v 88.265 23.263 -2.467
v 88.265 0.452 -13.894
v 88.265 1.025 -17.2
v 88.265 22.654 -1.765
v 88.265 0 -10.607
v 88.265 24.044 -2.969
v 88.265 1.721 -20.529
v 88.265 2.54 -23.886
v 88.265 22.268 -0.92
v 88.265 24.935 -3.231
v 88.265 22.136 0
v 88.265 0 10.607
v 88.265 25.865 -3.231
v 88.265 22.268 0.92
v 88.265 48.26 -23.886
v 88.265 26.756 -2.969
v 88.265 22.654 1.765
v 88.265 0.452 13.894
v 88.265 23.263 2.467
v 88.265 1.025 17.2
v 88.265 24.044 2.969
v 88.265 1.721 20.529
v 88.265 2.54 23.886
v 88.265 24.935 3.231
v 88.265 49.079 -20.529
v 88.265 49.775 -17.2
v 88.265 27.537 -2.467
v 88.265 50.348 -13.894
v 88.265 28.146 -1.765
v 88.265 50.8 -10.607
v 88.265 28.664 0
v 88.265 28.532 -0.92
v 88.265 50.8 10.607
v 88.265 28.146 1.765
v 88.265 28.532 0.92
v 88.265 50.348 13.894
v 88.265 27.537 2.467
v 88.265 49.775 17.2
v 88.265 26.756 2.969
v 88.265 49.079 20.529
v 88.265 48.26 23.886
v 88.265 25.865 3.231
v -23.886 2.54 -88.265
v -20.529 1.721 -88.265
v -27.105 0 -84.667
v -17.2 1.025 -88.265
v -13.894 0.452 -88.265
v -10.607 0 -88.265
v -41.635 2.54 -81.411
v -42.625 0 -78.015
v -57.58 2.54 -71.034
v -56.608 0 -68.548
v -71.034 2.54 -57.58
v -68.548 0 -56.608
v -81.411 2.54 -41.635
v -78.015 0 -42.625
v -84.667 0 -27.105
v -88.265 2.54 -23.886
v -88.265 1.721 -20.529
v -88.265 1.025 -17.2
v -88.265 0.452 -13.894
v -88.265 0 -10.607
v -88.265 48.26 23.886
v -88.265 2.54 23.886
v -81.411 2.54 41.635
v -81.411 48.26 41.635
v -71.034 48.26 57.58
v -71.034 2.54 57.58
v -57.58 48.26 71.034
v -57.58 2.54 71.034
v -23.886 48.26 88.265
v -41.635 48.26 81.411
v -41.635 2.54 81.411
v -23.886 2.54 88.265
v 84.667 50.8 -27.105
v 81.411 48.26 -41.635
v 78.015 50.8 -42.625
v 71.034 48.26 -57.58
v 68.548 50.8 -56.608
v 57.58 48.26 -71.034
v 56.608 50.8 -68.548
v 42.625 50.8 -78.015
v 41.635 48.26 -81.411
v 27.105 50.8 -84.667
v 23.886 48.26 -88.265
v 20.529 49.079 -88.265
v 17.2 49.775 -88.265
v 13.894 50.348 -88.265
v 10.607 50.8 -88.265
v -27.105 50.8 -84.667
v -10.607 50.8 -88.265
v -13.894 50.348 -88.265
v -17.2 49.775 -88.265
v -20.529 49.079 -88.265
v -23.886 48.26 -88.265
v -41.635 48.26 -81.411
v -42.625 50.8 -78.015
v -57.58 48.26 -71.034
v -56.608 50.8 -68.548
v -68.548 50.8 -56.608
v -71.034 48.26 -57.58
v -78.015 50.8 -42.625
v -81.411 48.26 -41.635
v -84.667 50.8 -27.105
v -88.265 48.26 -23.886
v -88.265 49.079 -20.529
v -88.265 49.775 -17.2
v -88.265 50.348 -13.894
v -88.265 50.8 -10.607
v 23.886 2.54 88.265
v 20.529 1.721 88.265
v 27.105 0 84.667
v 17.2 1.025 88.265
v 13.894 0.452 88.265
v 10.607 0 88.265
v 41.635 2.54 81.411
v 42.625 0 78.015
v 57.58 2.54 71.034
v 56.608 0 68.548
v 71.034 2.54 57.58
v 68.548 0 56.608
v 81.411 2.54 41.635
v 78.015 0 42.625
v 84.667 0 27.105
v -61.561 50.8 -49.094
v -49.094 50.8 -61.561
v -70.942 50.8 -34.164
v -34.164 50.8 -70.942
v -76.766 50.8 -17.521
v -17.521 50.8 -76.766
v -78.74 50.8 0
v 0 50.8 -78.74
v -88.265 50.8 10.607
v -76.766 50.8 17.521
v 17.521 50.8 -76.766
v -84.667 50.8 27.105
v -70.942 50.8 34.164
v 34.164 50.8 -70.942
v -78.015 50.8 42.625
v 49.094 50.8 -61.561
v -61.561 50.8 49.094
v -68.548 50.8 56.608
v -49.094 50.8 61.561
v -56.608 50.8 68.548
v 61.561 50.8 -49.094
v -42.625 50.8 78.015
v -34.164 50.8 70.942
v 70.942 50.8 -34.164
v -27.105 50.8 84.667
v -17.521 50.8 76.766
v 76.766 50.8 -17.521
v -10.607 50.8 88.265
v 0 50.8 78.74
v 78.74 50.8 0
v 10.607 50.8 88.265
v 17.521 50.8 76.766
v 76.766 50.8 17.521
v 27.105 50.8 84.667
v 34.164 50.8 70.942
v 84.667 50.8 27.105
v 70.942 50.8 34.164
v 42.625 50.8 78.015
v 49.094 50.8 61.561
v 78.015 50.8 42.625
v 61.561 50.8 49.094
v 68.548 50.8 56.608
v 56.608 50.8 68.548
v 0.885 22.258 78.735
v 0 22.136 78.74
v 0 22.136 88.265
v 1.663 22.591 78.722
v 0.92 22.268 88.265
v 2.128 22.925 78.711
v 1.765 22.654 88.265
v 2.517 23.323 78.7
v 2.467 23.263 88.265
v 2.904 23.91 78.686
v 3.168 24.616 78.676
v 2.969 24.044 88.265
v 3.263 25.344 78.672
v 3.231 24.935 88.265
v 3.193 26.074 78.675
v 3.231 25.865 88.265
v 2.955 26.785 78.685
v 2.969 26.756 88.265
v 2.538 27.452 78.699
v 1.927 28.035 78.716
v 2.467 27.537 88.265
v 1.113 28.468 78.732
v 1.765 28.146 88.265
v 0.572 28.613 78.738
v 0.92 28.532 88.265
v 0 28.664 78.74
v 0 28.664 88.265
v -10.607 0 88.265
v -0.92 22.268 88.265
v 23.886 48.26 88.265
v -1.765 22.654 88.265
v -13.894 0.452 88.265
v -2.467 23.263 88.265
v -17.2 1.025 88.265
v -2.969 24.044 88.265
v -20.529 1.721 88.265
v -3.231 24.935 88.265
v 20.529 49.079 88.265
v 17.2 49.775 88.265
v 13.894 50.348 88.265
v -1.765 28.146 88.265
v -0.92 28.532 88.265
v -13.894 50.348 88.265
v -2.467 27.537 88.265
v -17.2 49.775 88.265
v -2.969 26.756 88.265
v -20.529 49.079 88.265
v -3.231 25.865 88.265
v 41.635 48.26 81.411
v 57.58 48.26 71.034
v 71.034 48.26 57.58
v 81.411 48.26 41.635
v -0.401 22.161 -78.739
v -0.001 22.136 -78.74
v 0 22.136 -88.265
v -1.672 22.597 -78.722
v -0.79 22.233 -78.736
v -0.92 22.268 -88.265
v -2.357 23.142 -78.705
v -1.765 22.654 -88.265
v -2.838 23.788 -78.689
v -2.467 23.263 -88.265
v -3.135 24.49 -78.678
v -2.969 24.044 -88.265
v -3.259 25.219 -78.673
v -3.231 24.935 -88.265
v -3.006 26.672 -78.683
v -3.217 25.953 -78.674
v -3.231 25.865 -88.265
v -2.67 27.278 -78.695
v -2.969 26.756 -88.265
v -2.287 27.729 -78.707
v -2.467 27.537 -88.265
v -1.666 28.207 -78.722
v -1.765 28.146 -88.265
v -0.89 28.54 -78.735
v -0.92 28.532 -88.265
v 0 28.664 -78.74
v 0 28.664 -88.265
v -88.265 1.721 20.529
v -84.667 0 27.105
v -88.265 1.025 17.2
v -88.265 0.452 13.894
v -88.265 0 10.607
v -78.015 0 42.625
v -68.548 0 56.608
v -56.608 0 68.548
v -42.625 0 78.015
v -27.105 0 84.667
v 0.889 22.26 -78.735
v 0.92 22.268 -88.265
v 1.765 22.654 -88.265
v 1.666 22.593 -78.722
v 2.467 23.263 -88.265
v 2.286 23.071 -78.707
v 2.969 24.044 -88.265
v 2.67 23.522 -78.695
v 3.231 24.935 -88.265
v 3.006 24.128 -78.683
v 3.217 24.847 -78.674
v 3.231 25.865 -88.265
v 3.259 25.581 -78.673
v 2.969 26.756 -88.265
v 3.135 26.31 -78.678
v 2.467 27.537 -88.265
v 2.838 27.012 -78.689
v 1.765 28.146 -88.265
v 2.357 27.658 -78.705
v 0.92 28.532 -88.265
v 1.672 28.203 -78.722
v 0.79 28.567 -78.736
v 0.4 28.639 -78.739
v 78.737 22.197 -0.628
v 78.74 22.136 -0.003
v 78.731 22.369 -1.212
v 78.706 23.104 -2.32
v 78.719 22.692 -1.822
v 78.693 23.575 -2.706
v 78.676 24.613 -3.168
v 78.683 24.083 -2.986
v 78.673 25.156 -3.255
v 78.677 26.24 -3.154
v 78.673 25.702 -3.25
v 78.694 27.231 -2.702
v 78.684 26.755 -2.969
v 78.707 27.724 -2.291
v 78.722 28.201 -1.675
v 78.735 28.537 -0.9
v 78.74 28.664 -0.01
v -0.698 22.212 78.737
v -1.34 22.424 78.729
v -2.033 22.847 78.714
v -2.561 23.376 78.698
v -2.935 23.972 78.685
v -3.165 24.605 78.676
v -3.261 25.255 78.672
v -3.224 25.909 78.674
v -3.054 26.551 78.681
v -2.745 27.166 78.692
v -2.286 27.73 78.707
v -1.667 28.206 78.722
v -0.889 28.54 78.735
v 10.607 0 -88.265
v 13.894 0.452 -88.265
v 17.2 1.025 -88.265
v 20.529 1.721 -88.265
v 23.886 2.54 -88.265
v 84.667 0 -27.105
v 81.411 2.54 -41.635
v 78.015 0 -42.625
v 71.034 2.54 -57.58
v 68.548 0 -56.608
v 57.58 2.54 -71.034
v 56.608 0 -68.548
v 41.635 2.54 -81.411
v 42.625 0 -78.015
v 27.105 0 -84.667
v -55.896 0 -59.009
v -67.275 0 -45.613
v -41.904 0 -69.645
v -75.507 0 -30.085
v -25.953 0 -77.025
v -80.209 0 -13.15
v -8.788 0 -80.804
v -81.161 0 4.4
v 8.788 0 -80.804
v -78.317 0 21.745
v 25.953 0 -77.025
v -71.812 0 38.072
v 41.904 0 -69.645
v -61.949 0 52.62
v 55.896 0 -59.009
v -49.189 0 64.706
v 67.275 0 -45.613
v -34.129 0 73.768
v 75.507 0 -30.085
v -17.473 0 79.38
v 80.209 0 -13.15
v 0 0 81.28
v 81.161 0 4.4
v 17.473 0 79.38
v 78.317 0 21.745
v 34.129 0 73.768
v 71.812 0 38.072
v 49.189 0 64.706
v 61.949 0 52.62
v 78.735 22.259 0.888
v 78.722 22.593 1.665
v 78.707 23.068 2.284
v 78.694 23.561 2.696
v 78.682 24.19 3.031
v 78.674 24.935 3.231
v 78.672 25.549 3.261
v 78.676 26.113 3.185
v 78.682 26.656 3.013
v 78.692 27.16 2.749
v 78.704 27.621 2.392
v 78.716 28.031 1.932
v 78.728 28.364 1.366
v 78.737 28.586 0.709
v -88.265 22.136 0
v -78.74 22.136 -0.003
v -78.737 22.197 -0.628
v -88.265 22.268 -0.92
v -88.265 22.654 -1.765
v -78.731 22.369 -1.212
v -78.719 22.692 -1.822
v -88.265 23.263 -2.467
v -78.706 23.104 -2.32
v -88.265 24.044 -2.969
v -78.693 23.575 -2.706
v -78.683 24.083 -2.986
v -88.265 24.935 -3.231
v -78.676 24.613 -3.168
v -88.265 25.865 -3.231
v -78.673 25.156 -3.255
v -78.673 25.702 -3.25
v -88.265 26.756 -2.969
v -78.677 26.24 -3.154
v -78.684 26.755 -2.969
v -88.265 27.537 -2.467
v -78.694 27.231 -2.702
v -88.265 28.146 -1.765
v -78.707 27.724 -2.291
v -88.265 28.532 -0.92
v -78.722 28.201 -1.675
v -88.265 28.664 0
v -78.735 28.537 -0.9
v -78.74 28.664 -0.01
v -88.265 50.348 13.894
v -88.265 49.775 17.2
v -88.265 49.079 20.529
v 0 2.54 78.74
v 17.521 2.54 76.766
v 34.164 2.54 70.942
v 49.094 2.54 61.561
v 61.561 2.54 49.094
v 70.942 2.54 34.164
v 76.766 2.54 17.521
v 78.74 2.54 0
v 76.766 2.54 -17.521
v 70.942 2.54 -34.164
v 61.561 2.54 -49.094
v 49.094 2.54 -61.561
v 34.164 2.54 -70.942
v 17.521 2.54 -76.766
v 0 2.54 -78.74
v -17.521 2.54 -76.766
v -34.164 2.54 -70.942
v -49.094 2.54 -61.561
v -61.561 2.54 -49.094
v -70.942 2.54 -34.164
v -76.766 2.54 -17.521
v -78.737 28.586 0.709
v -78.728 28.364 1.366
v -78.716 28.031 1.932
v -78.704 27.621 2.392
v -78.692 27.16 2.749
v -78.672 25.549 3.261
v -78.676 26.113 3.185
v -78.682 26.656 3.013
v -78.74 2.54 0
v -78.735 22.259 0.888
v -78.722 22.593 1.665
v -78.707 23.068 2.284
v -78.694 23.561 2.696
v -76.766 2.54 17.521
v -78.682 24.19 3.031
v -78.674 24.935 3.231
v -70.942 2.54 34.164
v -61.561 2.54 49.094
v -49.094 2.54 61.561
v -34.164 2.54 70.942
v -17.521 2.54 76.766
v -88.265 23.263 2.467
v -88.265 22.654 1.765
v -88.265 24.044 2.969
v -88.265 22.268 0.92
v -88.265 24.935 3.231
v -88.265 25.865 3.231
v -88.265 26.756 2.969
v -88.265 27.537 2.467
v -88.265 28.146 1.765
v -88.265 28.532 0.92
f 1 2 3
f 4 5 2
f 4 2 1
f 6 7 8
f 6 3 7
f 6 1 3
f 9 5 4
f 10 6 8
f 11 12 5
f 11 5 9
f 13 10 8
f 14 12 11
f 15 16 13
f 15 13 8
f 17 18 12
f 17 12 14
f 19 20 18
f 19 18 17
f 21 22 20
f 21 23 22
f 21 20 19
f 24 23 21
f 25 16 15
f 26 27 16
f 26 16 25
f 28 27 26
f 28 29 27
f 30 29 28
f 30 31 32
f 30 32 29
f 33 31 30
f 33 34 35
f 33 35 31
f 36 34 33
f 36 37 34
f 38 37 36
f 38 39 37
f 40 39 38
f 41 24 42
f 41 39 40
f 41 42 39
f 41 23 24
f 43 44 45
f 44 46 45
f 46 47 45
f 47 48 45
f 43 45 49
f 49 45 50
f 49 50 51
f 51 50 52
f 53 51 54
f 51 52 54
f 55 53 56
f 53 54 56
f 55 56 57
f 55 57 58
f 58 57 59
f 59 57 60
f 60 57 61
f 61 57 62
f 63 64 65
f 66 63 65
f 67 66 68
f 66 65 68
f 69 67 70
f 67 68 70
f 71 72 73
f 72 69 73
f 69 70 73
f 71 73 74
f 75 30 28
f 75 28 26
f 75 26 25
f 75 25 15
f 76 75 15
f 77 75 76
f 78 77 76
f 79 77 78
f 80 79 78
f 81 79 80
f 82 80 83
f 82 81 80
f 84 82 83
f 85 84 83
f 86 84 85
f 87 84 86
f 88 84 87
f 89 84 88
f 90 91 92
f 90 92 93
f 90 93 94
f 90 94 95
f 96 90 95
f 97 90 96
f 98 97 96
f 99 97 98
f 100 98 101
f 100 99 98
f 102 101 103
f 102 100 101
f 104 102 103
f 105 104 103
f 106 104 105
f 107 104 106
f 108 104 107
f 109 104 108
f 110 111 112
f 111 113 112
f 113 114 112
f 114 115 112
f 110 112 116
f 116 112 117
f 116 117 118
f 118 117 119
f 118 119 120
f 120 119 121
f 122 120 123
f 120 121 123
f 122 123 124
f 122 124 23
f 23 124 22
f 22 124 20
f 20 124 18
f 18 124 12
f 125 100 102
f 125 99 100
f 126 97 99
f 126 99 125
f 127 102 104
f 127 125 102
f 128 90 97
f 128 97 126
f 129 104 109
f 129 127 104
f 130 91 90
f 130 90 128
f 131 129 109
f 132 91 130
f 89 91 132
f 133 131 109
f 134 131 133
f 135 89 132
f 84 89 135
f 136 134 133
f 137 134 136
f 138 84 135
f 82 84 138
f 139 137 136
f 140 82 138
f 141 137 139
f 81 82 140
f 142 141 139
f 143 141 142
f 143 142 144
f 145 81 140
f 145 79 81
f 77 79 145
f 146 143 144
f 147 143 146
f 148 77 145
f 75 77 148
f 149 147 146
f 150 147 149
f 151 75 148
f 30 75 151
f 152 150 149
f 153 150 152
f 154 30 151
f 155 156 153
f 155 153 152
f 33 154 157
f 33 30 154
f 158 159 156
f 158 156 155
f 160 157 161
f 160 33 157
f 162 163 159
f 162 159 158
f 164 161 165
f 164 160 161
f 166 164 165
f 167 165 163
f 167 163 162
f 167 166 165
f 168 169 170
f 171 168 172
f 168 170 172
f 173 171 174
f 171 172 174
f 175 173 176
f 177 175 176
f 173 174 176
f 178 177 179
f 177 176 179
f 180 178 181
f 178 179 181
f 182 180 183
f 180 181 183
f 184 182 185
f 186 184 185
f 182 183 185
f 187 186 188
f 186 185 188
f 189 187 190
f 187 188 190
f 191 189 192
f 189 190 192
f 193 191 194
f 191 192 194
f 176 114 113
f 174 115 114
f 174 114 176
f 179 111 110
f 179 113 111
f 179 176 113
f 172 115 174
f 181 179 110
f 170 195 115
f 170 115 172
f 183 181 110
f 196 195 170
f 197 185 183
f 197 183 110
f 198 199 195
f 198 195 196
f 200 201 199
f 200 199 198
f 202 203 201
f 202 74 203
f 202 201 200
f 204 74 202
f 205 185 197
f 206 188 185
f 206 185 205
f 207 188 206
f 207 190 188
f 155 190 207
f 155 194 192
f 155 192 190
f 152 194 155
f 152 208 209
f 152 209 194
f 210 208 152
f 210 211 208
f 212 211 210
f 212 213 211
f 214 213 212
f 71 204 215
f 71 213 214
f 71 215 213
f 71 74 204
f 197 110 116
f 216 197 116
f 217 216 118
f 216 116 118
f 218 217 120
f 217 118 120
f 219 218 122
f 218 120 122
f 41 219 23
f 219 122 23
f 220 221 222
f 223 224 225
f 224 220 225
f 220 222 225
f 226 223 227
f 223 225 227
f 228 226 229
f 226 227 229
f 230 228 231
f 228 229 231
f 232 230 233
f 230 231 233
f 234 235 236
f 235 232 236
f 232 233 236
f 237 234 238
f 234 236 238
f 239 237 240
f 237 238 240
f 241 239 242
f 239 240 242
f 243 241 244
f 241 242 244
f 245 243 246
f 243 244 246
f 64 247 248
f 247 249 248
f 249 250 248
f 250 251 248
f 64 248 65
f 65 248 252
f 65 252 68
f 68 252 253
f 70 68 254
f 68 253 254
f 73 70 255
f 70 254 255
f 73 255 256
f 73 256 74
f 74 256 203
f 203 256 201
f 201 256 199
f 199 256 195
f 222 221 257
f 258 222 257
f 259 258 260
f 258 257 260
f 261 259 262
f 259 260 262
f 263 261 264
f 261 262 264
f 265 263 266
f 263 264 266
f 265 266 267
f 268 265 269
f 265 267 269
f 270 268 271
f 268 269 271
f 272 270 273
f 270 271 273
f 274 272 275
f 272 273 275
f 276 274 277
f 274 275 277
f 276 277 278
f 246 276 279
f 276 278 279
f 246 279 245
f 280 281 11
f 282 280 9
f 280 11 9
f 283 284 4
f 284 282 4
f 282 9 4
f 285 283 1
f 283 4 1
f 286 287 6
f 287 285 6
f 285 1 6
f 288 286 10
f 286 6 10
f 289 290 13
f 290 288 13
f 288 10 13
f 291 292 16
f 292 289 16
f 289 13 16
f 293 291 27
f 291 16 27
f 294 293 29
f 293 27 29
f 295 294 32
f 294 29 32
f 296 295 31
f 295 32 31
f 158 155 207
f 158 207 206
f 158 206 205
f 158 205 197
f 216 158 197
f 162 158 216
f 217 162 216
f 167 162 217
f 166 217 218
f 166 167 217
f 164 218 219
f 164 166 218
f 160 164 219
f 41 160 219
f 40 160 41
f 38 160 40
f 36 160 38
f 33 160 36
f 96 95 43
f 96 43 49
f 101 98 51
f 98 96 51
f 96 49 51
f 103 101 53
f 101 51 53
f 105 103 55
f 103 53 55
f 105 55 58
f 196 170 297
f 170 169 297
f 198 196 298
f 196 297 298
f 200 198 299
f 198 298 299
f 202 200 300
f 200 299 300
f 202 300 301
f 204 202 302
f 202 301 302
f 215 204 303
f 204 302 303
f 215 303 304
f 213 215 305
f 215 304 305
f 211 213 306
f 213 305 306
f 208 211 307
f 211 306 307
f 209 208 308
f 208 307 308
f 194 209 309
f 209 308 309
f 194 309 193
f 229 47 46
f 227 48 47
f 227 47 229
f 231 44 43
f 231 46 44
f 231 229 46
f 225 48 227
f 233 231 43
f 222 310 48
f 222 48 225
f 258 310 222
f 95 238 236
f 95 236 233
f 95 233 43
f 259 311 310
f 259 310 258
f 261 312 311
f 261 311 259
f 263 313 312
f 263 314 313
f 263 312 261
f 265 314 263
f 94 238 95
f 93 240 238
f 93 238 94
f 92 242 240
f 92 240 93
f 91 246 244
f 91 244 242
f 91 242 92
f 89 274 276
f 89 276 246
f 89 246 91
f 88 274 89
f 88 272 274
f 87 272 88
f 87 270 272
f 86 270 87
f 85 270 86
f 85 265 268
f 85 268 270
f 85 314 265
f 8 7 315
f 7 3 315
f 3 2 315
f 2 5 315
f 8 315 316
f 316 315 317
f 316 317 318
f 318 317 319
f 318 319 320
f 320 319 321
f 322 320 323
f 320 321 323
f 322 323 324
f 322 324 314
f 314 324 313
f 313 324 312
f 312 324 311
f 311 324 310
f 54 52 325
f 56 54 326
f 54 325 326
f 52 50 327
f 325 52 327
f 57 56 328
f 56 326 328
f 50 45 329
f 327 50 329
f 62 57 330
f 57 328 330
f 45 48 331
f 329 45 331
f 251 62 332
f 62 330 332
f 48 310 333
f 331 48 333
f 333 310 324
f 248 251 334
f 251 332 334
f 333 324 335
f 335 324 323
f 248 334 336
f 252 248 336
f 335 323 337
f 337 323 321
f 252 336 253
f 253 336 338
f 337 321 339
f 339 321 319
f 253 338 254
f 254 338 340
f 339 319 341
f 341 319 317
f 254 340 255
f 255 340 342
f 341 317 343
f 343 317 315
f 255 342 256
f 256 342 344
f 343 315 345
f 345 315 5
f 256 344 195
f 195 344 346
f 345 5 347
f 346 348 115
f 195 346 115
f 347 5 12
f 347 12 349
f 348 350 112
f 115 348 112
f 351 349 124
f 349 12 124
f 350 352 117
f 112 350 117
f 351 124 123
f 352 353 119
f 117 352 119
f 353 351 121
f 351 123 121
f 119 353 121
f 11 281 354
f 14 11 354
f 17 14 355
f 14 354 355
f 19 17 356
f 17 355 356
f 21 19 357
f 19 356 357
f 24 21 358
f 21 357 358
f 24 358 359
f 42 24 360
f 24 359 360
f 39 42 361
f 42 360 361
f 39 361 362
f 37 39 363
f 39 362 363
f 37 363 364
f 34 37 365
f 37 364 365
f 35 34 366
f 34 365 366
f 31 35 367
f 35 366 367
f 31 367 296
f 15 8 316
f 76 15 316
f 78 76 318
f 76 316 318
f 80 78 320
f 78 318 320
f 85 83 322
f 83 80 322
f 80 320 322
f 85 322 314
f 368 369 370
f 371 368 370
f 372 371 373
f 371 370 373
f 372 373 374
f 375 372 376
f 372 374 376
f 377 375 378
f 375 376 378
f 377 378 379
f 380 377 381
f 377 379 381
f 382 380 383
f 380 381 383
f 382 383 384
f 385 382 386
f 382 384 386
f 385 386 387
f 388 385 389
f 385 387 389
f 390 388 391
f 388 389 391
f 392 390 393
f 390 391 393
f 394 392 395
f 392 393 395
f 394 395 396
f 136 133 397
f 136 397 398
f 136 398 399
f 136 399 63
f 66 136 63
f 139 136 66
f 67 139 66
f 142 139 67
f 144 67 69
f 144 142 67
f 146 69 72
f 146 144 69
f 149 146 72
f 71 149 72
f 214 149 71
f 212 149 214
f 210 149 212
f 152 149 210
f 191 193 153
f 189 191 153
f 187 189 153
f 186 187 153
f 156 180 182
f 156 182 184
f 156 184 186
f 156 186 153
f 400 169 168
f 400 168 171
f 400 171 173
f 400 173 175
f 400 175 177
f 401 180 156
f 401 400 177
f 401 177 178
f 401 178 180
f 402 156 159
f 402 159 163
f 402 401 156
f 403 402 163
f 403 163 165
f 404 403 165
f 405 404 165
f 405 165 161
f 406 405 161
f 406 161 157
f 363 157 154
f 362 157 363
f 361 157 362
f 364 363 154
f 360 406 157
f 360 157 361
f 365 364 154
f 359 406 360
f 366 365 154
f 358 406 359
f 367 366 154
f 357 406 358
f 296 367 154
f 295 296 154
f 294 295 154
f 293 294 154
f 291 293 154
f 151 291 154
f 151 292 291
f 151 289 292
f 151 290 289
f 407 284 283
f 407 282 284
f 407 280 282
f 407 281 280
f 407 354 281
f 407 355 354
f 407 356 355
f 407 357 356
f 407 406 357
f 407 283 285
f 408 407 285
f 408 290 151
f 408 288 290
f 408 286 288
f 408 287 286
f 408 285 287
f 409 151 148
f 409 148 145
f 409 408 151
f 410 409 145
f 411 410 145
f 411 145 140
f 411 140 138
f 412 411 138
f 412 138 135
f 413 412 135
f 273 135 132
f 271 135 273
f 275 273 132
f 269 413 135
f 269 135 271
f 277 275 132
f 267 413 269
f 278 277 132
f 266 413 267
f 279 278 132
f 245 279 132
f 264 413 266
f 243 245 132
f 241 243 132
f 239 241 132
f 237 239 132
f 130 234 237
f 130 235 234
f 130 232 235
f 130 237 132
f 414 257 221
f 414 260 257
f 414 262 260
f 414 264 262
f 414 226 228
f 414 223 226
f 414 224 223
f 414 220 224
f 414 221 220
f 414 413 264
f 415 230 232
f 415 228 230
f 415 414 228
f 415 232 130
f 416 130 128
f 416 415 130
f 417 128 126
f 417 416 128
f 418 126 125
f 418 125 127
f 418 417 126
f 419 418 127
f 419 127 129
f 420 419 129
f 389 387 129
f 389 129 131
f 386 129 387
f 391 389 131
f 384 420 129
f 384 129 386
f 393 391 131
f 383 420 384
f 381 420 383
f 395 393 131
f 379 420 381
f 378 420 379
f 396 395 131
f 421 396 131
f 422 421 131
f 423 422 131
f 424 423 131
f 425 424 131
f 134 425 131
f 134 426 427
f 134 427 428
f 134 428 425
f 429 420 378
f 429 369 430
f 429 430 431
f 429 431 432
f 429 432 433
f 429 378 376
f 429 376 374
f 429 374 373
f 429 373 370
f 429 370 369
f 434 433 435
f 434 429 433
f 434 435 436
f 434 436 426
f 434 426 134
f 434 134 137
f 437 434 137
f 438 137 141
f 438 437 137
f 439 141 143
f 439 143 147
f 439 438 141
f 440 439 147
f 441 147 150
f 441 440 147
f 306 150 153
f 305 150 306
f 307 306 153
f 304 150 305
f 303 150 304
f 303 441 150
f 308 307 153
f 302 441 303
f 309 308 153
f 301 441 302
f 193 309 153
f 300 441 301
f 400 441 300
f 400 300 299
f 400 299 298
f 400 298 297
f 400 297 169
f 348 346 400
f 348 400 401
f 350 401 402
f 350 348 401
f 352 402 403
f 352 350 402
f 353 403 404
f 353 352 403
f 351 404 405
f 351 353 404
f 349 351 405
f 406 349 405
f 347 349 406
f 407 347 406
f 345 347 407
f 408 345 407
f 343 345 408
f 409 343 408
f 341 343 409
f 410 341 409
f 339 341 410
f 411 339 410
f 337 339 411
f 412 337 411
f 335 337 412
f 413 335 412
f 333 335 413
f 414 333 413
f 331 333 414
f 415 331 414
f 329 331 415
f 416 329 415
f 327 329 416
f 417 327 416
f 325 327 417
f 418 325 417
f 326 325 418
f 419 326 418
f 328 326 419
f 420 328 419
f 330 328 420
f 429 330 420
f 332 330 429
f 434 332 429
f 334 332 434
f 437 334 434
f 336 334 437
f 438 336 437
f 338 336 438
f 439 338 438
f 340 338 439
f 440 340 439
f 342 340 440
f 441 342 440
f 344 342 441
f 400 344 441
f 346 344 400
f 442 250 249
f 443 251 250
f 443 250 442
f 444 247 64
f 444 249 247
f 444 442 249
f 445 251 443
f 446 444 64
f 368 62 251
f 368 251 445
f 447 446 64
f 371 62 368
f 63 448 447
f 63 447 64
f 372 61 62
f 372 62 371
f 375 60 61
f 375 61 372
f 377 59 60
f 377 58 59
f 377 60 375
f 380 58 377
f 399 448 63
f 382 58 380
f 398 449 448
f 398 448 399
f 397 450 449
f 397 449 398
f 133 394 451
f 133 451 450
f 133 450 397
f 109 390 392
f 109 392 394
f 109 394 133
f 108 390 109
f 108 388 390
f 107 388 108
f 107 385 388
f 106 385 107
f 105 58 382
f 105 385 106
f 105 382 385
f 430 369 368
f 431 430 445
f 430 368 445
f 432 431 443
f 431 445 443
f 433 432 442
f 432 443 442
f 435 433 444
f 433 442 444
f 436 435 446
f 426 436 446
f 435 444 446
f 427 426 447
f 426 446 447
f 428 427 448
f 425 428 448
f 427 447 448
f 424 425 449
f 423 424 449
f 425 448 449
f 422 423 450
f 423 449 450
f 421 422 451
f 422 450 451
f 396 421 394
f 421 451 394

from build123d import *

# Parameters (mm, degrees)
SKETCH1_R           = 91.44
SKETCH1_R_2         = 78.74
BOSS_EXTRUDE1_DEPTH = 50.8
CHAMFER1_SIZE       = 2.54
SKETCH2_W           = 16.258151814
SKETCH2_H           = 87.529352209
CUT_EXTRUDE1_DEPTH  = 127
CIRPATTERN1_COUNT   = 4
SKETCH3_R           = 3.2639
CUT_EXTRUDE2_DEPTH  = 204.799389413
CIRPATTERN2_COUNT   = 4


with BuildPart() as part:
    # Sketch1 → Boss-Extrude1 (new body)
    with BuildSketch(Plane(origin=(0, 0, 0), x_dir=(1, 0, 0), z_dir=(0, 1, 0))):
        with Locations(Location((0, 0, 0), (0, 0, 270))):
            Circle(SKETCH1_R)
        with Locations(Location((0, 0, 0), (0, 0, 270))):
            Circle(SKETCH1_R_2, mode=Mode.SUBTRACT)
    extrude(amount=BOSS_EXTRUDE1_DEPTH)

    # Chamfer1
    chamfer1_edges = [part.edges().sort_by_distance(p)[0] for p in [
        (0, 0, -91.44),
        (0, 50.8, -91.44),
        (0, 0, -78.74),
    ]]
    chamfer(chamfer1_edges, length=CHAMFER1_SIZE)

    # Sketch2 → Cut-Extrude1 (cut, symmetric)
    with BuildSketch(Plane.XY):
        with Locations((96.394075907, 25.589048277)):
            Rectangle(SKETCH2_W, SKETCH2_H)
    cut_extrude1 = extrude(amount=CUT_EXTRUDE1_DEPTH, both=True, mode=Mode.SUBTRACT)

    # CirPattern1: Cut-Extrude1 ×4 about axis
    cirpattern1_axis = Axis((0, 0, 0), (0, 1, 0))
    for i in range(1, CIRPATTERN1_COUNT):
        add(cut_extrude1.rotate(cirpattern1_axis, i * 360 / CIRPATTERN1_COUNT), mode=Mode.SUBTRACT)

    # Sketch3 → Cut-Extrude2 (cut, through all)
    with BuildSketch(Plane(origin=(0, 0, -88.265), x_dir=(-1, 0, 0), z_dir=(0, 0, -1))):
        with Locations((3.65e-06, 25.4)):
            Circle(SKETCH3_R)
    cut_extrude2 = extrude(amount=-CUT_EXTRUDE2_DEPTH, mode=Mode.SUBTRACT)

    # CirPattern2: Cut-Extrude2 ×4 about axis
    cirpattern2_axis = Axis((0, 50.8, 0), (0, 1, 0))
    for i in range(1, CIRPATTERN2_COUNT):
        add(cut_extrude2.rotate(cirpattern2_axis, i * 360 / CIRPATTERN2_COUNT), mode=Mode.SUBTRACT)


solid = part.part
